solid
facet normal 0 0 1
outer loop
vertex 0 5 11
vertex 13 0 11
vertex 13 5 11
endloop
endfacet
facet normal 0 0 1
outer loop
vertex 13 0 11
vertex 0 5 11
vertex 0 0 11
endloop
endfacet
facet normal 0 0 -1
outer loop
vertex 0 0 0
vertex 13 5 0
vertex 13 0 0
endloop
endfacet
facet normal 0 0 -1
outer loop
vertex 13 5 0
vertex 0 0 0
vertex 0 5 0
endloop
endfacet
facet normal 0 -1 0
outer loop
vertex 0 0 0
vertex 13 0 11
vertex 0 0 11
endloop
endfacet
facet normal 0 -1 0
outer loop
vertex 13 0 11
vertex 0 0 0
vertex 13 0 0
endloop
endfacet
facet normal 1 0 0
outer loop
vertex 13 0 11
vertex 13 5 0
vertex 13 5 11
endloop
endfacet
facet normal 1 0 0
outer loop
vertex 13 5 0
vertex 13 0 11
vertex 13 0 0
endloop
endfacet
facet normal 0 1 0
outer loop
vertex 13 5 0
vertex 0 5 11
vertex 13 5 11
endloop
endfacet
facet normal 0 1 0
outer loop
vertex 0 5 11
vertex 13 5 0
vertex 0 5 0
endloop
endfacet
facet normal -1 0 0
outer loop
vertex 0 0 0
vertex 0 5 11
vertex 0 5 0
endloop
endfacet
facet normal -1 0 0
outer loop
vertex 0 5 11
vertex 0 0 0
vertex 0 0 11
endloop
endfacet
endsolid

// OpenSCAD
// Generated by SolidPython 1.0.1 on 2020-07-29 00:46:55


cube(size = [13, 5, 11]);
/***********************************************
*********      SolidPython code:      **********
************************************************
 
# import packages: SolidPython
from solid import *
from solid.utils import *
from itertools import chain, combinations, permutations


class Resize:

    def __init__(self, scad_file):
        self.scad_file = scad_file
        #self.scad_file = import_scad(scad_file)
        # cone/cylinder param:
        self.r1 = 0
        self.r2 = 0
        self.h = 0
        # rectangular prism param:
        self.w = 0
        self.l = 0
        # ellipse param:
        self.r = 0

    # import OpenScad code (file name corresponds to shape)


    # classify shape + parameters
    def assign(self, param1, param2, param3):
        if self.scad_file == 'cone.scad':
            self.r1 = param1
            self.r2 = param2
            self.h = param3
        elif self.scad_file == 'cylinder.scad':
            self.r1 = param1
            self.r2 = param2
            self.h = param3
        elif self.scad_file == 'rectangularPrism.scad':
            self.h = param1
            self.l = param2
            self.w = param3
        else:
            self.r = param1
            self.h = param2

    # resize parameters
    def iterate(self):
        x = range(3, 20, 2)
        i = 1
        if self.scad_file == 'cone.scad':
            tempList = list(permutations(x, 2))
            for temp in tempList:
                param1 = temp[0]
                param2 = temp[1]
                filepath = 'produced_scad_files/' + 'cone' + str(param1) + '_' + str(param2) + '_' + '.scad'
                scad_render_to_file(cylinder(h=param1, r1=param2, r2=0), filepath)

        elif self.scad_file == 'cylinder.scad':
            tempList = list(permutations(x, 3))
            for temp in tempList:
                param1 = temp[0]
                param2 = temp[1]
                filepath = 'produced_scad_files/' + 'cylinder' + str(param1) + '_' + str(param2) + '_' + '.scad'
                scad_render_to_file(cylinder(h=param1, r1=param2, r2=param2), filepath)

        elif self.scad_file == 'rectangularPrism.scad':
            tempList = list(permutations(x, 3))
            for temp in tempList:
                param1 = temp[0]
                param2 = temp[1]
                param3 = temp[2]
                filepath = 'produced_scad_files/' + 'rectangularPrism' + str(param1) + '_' + str(param2) + '_' + str(
                    param3) + '.scad'
                scad_render_to_file(cube(size=(param1, param2, param3)), filepath)

        elif self.scad_file == 'ellipse.scad':
            tempList = list(permutations(x, 4))
            for temp in tempList:
                param1 = temp[0]
                param2 = temp[1]
                param3 = temp[2]
                param4 = temp[3]
                filepath = 'produced_scad_files/' + 'ellipse' + str(param1) + '_' + str(param2) + '_' + str(param3) + '_' + str(param4) + '.scad'
                scad_render_to_file(scale([param1, param2, param3])(sphere(r=param4)), filepath)

    def render_to_scadfile(self):
        scad_render_to_file(scad, 'example.scad') 
 
************************************************/
